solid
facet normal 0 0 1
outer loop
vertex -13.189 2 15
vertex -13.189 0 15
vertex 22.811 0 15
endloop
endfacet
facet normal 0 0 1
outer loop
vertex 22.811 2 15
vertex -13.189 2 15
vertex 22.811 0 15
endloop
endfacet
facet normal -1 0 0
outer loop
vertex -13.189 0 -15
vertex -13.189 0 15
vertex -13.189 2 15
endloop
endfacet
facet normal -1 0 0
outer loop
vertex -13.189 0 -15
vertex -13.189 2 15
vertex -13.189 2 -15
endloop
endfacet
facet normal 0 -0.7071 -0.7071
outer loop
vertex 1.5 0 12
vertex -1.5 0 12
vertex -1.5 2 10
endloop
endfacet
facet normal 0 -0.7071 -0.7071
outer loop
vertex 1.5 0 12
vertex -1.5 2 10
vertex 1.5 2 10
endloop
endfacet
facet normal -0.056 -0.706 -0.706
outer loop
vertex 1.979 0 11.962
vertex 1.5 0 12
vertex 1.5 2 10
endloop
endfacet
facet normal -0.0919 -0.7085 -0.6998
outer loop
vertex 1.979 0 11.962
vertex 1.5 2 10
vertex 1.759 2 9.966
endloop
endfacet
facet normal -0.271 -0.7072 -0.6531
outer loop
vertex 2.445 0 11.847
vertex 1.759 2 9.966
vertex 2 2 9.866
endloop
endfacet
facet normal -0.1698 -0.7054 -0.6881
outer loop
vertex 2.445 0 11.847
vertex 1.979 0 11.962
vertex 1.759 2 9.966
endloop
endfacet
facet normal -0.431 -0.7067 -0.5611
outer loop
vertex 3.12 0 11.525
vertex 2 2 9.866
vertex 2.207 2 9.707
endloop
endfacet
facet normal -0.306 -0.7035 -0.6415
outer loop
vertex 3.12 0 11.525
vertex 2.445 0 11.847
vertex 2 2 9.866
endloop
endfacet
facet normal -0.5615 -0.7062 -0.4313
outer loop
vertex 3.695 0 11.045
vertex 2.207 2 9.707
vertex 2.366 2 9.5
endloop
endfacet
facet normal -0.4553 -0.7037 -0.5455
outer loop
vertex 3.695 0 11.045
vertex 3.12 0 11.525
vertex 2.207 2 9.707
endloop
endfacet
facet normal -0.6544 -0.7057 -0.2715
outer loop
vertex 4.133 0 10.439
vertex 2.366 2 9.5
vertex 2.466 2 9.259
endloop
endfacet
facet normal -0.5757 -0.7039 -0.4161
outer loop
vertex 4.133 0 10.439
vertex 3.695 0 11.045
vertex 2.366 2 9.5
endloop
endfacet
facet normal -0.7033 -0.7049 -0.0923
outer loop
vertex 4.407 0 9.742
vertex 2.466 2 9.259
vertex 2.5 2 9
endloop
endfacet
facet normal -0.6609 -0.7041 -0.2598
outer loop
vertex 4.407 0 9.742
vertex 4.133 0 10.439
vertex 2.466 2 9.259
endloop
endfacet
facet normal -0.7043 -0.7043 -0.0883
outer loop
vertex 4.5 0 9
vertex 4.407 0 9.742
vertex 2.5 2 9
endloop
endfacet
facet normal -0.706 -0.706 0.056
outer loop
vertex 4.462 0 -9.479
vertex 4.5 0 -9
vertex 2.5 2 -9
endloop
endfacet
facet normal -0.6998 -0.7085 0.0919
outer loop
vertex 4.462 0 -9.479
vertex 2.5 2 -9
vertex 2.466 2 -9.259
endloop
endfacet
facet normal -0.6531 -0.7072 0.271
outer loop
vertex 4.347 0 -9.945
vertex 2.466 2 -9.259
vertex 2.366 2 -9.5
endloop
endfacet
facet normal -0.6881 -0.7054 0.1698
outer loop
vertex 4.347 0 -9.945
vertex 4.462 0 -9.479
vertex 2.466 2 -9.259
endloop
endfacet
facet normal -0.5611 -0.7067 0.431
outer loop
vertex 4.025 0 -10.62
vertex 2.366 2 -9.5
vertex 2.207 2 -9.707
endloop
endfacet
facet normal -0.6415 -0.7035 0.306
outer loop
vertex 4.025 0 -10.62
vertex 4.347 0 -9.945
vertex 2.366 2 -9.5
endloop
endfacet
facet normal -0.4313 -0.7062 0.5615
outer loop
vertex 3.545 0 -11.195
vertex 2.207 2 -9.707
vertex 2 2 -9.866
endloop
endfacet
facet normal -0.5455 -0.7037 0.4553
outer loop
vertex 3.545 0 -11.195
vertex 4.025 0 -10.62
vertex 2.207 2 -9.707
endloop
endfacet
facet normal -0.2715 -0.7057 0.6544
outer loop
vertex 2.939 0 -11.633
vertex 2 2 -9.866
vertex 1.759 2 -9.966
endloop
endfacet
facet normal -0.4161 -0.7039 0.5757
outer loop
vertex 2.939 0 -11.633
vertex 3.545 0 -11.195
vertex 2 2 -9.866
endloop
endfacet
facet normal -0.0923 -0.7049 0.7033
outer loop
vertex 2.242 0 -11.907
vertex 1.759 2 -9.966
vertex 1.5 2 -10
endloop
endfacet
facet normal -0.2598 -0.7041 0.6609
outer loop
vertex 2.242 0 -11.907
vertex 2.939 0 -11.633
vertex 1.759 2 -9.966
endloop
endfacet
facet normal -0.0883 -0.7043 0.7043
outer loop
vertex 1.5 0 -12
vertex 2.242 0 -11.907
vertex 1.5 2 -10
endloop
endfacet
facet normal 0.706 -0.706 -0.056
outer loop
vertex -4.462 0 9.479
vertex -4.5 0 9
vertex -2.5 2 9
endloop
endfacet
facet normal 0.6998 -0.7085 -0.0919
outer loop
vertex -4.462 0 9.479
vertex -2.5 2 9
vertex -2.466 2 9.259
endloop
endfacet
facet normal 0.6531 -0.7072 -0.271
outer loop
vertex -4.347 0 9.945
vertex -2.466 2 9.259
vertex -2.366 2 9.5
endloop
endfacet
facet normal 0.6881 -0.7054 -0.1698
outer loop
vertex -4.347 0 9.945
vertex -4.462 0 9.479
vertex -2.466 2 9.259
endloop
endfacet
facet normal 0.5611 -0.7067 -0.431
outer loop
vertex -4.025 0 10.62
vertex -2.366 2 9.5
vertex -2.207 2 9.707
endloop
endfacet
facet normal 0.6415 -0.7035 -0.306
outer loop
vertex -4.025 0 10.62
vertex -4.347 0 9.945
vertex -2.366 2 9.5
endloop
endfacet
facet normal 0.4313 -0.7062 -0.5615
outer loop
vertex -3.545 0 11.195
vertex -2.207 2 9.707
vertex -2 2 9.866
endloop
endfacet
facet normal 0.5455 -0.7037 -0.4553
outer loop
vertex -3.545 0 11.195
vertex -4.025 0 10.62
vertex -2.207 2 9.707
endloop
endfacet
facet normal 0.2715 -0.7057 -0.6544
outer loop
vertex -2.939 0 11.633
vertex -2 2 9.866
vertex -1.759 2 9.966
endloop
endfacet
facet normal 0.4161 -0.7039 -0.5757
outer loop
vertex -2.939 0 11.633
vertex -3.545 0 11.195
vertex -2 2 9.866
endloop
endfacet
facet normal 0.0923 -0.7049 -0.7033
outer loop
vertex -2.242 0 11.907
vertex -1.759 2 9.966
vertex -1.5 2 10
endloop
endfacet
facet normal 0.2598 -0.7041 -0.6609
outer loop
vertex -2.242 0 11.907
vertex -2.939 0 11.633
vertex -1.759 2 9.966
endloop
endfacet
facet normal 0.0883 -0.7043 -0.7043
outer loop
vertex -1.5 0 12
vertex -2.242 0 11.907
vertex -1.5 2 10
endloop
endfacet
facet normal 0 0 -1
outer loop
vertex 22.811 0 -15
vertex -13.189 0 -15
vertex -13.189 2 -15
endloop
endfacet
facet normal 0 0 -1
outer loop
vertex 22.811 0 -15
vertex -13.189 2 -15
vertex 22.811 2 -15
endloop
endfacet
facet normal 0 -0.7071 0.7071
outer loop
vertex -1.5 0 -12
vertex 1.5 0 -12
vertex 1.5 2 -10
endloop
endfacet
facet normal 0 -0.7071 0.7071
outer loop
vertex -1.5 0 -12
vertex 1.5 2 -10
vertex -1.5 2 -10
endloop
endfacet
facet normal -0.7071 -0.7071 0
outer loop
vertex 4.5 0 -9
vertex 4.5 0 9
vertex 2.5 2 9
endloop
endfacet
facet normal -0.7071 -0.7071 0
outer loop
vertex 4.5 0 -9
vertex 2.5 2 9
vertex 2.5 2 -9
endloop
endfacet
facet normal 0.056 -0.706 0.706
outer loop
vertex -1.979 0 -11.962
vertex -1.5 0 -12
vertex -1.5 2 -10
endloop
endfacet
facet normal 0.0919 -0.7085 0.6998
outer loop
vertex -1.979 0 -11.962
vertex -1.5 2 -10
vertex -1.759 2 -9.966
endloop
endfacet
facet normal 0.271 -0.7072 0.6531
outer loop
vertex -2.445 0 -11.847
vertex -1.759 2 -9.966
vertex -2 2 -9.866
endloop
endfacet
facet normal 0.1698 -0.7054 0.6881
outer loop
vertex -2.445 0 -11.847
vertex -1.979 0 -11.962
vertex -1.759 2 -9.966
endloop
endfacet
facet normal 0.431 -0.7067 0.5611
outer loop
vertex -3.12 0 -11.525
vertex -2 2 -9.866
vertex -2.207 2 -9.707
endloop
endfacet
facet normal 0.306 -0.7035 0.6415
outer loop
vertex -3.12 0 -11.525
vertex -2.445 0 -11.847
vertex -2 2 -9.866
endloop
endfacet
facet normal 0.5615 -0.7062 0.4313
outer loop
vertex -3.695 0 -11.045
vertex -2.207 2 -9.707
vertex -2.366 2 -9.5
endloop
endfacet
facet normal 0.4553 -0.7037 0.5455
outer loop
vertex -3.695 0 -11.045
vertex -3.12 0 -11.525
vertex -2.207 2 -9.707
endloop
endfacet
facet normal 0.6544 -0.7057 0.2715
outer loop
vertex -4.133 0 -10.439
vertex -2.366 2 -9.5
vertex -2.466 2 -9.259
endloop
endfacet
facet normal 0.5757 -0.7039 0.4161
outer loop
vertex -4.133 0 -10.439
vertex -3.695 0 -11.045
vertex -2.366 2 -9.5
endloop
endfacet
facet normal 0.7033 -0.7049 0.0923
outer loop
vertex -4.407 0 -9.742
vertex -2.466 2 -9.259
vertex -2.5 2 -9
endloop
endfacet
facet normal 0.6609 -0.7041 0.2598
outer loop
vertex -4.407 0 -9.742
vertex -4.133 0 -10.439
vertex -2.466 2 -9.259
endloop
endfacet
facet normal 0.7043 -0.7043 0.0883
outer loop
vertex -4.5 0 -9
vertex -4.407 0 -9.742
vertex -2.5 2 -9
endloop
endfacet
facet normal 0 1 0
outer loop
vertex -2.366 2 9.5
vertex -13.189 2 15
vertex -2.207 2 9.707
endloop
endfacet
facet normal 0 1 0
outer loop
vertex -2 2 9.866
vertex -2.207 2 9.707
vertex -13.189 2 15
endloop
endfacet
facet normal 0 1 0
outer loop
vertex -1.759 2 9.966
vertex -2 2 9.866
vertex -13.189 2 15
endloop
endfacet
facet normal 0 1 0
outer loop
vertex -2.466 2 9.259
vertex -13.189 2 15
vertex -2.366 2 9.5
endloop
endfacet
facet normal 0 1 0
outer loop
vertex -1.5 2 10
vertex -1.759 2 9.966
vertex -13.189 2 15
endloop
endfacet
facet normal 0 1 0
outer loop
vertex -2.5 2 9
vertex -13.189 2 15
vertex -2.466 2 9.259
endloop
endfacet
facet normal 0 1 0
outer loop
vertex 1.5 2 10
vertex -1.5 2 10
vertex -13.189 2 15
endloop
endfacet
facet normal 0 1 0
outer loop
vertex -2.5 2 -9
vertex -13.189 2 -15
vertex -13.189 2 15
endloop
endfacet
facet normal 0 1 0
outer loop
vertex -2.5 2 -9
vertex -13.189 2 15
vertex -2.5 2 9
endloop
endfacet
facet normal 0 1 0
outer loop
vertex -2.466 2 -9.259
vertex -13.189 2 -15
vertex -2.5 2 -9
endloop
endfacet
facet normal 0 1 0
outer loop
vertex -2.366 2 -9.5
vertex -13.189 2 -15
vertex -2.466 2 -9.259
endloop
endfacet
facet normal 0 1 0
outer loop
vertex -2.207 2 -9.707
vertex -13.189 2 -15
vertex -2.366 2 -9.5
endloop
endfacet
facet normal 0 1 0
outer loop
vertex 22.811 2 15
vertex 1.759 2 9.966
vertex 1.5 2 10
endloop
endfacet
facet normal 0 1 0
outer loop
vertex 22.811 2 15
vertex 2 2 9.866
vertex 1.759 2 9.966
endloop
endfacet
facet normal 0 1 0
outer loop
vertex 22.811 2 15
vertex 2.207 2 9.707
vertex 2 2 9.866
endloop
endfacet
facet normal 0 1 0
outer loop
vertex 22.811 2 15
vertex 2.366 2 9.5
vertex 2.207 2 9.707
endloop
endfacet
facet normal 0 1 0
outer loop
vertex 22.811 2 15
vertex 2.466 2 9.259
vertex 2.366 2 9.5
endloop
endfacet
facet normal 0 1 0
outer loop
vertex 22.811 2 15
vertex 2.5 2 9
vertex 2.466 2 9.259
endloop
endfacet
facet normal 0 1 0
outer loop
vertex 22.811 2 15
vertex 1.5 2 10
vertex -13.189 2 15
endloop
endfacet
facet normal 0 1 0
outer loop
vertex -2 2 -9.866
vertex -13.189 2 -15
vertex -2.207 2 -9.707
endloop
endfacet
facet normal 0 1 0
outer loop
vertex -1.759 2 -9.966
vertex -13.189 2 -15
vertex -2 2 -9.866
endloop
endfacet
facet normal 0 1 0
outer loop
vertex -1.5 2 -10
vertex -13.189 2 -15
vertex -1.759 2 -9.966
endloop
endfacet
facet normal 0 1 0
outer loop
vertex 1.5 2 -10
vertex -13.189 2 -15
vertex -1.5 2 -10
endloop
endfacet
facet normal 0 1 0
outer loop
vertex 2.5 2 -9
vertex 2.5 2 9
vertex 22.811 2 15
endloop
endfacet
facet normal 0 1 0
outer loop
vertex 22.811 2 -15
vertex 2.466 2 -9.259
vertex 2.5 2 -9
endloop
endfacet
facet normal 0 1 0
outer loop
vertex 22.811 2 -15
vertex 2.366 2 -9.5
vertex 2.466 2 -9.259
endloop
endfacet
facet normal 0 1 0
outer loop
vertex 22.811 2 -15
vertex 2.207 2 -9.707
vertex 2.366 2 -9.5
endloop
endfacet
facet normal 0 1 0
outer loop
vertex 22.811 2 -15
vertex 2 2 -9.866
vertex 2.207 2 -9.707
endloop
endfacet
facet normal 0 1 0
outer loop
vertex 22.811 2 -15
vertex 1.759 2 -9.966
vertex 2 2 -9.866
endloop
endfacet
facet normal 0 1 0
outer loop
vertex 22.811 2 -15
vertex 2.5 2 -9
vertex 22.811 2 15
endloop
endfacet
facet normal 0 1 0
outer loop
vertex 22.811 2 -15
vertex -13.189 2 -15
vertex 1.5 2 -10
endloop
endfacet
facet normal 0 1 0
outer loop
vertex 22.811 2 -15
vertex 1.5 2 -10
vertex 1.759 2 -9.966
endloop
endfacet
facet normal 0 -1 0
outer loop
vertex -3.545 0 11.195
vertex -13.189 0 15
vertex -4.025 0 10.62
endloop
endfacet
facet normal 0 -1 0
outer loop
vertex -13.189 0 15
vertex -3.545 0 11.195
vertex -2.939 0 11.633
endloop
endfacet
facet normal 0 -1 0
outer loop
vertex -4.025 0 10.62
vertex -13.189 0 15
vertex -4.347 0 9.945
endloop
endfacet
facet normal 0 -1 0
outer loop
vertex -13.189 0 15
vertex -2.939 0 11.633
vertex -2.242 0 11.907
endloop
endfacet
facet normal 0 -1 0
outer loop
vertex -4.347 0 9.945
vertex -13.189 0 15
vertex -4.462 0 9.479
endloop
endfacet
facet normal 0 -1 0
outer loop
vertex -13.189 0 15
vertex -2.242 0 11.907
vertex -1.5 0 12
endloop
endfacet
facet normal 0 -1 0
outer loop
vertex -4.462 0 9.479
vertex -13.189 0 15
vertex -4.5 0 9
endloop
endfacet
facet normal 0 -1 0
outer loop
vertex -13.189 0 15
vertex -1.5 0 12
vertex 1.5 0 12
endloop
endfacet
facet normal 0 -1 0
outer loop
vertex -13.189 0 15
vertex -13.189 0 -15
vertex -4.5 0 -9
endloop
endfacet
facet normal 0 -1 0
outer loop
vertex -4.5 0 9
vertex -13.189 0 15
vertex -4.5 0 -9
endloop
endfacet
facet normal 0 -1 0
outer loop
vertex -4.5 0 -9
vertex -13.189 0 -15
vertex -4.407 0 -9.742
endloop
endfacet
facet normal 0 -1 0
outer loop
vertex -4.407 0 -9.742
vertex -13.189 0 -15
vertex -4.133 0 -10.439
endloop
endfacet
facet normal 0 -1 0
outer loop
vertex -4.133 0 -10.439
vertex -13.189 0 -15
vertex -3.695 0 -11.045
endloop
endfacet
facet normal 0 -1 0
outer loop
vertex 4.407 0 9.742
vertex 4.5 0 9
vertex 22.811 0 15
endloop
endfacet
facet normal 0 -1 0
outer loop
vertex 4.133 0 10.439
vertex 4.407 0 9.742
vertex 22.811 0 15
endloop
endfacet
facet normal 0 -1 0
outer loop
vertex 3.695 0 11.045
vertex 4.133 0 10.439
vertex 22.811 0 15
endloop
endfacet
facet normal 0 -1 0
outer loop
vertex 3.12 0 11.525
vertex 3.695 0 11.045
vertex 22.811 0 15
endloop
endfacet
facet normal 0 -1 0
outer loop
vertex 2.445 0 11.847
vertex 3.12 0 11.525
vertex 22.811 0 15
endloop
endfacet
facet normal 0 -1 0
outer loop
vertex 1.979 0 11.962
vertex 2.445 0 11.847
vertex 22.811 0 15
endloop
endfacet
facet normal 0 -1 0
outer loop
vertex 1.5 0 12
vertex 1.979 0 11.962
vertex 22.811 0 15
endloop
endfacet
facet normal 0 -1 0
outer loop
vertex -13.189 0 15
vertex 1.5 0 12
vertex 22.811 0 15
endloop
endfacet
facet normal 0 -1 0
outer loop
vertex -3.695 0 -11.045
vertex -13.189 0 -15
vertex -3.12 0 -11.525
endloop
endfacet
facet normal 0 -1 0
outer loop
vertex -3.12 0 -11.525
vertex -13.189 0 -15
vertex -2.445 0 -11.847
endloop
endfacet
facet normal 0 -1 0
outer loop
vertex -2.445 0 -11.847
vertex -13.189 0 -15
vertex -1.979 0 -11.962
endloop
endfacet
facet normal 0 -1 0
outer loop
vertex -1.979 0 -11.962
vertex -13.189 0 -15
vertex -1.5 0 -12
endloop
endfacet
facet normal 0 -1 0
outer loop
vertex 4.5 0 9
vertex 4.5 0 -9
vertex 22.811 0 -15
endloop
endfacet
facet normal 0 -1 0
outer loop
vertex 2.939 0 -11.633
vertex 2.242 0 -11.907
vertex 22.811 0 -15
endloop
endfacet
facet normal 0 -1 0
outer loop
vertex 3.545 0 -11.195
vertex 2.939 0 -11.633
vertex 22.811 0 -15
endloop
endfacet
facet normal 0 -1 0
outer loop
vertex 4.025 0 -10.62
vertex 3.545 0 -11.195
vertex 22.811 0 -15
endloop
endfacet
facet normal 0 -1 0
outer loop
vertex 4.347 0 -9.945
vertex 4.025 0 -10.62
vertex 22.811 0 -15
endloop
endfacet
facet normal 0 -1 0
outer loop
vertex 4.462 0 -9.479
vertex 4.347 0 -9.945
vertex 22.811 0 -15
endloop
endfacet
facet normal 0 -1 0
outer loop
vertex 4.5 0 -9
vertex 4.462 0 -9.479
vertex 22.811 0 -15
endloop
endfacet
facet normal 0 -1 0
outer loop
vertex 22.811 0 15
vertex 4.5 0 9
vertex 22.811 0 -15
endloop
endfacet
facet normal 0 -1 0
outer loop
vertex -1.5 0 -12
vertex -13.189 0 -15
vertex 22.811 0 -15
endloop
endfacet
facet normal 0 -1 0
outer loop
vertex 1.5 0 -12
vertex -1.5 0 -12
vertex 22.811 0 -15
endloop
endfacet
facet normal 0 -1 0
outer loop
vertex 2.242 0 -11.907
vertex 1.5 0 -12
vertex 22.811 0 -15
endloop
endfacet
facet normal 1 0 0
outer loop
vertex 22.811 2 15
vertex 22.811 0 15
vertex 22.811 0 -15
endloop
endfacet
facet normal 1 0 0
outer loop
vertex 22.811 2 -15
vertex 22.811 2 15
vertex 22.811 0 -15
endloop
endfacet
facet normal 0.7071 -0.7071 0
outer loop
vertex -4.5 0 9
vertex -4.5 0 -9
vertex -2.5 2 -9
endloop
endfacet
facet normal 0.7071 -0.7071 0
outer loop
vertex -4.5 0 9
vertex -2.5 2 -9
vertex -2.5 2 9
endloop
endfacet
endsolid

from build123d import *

# Parameters (mm, degrees)
SKETCH2_W           = 36
SKETCH2_H           = 30
BOSS_EXTRUDE1_DEPTH = 2
CUT_EXTRUDE4_DEPTH  = 3
CUT_EXTRUDE4_TAPER  = -45


with BuildPart() as part:
    # Sketch2 → Boss-Extrude1 (new body)
    with BuildSketch(Plane(origin=(0, 0, 0), x_dir=(1, 0, 0), z_dir=(0, 1, 0))):
        with Locations((4.811028754, 0)):
            Rectangle(SKETCH2_W, SKETCH2_H)
    extrude(amount=BOSS_EXTRUDE1_DEPTH)

    # Sketch4 → Cut-Extrude4 (cut, through all)
    with BuildSketch(Plane(origin=(0, 2, 0), x_dir=(1, 0, 0), z_dir=(0, 1, 0))):
        with BuildLine():
            ThreePointArc((1.5, -10), (2.207106781, -9.707106781), (2.5, -9))
            Line((2.5, -9), (2.5, 9))
            ThreePointArc((2.5, 9), (2.207106781, 9.707106781), (1.5, 10))
            Line((1.5, 10), (-1.5, 10))
            ThreePointArc((-1.5, 10), (-2.207106781, 9.707106781), (-2.5, 9))
            Line((-2.5, 9), (-2.5, -9))
            ThreePointArc((-2.5, -9), (-2.207106781, -9.707106781), (-1.5, -10))
            Line((-1.5, -10), (1.5, -10))
        make_face()
    extrude(amount=-CUT_EXTRUDE4_DEPTH, taper=CUT_EXTRUDE4_TAPER, mode=Mode.SUBTRACT)


solid = part.part
